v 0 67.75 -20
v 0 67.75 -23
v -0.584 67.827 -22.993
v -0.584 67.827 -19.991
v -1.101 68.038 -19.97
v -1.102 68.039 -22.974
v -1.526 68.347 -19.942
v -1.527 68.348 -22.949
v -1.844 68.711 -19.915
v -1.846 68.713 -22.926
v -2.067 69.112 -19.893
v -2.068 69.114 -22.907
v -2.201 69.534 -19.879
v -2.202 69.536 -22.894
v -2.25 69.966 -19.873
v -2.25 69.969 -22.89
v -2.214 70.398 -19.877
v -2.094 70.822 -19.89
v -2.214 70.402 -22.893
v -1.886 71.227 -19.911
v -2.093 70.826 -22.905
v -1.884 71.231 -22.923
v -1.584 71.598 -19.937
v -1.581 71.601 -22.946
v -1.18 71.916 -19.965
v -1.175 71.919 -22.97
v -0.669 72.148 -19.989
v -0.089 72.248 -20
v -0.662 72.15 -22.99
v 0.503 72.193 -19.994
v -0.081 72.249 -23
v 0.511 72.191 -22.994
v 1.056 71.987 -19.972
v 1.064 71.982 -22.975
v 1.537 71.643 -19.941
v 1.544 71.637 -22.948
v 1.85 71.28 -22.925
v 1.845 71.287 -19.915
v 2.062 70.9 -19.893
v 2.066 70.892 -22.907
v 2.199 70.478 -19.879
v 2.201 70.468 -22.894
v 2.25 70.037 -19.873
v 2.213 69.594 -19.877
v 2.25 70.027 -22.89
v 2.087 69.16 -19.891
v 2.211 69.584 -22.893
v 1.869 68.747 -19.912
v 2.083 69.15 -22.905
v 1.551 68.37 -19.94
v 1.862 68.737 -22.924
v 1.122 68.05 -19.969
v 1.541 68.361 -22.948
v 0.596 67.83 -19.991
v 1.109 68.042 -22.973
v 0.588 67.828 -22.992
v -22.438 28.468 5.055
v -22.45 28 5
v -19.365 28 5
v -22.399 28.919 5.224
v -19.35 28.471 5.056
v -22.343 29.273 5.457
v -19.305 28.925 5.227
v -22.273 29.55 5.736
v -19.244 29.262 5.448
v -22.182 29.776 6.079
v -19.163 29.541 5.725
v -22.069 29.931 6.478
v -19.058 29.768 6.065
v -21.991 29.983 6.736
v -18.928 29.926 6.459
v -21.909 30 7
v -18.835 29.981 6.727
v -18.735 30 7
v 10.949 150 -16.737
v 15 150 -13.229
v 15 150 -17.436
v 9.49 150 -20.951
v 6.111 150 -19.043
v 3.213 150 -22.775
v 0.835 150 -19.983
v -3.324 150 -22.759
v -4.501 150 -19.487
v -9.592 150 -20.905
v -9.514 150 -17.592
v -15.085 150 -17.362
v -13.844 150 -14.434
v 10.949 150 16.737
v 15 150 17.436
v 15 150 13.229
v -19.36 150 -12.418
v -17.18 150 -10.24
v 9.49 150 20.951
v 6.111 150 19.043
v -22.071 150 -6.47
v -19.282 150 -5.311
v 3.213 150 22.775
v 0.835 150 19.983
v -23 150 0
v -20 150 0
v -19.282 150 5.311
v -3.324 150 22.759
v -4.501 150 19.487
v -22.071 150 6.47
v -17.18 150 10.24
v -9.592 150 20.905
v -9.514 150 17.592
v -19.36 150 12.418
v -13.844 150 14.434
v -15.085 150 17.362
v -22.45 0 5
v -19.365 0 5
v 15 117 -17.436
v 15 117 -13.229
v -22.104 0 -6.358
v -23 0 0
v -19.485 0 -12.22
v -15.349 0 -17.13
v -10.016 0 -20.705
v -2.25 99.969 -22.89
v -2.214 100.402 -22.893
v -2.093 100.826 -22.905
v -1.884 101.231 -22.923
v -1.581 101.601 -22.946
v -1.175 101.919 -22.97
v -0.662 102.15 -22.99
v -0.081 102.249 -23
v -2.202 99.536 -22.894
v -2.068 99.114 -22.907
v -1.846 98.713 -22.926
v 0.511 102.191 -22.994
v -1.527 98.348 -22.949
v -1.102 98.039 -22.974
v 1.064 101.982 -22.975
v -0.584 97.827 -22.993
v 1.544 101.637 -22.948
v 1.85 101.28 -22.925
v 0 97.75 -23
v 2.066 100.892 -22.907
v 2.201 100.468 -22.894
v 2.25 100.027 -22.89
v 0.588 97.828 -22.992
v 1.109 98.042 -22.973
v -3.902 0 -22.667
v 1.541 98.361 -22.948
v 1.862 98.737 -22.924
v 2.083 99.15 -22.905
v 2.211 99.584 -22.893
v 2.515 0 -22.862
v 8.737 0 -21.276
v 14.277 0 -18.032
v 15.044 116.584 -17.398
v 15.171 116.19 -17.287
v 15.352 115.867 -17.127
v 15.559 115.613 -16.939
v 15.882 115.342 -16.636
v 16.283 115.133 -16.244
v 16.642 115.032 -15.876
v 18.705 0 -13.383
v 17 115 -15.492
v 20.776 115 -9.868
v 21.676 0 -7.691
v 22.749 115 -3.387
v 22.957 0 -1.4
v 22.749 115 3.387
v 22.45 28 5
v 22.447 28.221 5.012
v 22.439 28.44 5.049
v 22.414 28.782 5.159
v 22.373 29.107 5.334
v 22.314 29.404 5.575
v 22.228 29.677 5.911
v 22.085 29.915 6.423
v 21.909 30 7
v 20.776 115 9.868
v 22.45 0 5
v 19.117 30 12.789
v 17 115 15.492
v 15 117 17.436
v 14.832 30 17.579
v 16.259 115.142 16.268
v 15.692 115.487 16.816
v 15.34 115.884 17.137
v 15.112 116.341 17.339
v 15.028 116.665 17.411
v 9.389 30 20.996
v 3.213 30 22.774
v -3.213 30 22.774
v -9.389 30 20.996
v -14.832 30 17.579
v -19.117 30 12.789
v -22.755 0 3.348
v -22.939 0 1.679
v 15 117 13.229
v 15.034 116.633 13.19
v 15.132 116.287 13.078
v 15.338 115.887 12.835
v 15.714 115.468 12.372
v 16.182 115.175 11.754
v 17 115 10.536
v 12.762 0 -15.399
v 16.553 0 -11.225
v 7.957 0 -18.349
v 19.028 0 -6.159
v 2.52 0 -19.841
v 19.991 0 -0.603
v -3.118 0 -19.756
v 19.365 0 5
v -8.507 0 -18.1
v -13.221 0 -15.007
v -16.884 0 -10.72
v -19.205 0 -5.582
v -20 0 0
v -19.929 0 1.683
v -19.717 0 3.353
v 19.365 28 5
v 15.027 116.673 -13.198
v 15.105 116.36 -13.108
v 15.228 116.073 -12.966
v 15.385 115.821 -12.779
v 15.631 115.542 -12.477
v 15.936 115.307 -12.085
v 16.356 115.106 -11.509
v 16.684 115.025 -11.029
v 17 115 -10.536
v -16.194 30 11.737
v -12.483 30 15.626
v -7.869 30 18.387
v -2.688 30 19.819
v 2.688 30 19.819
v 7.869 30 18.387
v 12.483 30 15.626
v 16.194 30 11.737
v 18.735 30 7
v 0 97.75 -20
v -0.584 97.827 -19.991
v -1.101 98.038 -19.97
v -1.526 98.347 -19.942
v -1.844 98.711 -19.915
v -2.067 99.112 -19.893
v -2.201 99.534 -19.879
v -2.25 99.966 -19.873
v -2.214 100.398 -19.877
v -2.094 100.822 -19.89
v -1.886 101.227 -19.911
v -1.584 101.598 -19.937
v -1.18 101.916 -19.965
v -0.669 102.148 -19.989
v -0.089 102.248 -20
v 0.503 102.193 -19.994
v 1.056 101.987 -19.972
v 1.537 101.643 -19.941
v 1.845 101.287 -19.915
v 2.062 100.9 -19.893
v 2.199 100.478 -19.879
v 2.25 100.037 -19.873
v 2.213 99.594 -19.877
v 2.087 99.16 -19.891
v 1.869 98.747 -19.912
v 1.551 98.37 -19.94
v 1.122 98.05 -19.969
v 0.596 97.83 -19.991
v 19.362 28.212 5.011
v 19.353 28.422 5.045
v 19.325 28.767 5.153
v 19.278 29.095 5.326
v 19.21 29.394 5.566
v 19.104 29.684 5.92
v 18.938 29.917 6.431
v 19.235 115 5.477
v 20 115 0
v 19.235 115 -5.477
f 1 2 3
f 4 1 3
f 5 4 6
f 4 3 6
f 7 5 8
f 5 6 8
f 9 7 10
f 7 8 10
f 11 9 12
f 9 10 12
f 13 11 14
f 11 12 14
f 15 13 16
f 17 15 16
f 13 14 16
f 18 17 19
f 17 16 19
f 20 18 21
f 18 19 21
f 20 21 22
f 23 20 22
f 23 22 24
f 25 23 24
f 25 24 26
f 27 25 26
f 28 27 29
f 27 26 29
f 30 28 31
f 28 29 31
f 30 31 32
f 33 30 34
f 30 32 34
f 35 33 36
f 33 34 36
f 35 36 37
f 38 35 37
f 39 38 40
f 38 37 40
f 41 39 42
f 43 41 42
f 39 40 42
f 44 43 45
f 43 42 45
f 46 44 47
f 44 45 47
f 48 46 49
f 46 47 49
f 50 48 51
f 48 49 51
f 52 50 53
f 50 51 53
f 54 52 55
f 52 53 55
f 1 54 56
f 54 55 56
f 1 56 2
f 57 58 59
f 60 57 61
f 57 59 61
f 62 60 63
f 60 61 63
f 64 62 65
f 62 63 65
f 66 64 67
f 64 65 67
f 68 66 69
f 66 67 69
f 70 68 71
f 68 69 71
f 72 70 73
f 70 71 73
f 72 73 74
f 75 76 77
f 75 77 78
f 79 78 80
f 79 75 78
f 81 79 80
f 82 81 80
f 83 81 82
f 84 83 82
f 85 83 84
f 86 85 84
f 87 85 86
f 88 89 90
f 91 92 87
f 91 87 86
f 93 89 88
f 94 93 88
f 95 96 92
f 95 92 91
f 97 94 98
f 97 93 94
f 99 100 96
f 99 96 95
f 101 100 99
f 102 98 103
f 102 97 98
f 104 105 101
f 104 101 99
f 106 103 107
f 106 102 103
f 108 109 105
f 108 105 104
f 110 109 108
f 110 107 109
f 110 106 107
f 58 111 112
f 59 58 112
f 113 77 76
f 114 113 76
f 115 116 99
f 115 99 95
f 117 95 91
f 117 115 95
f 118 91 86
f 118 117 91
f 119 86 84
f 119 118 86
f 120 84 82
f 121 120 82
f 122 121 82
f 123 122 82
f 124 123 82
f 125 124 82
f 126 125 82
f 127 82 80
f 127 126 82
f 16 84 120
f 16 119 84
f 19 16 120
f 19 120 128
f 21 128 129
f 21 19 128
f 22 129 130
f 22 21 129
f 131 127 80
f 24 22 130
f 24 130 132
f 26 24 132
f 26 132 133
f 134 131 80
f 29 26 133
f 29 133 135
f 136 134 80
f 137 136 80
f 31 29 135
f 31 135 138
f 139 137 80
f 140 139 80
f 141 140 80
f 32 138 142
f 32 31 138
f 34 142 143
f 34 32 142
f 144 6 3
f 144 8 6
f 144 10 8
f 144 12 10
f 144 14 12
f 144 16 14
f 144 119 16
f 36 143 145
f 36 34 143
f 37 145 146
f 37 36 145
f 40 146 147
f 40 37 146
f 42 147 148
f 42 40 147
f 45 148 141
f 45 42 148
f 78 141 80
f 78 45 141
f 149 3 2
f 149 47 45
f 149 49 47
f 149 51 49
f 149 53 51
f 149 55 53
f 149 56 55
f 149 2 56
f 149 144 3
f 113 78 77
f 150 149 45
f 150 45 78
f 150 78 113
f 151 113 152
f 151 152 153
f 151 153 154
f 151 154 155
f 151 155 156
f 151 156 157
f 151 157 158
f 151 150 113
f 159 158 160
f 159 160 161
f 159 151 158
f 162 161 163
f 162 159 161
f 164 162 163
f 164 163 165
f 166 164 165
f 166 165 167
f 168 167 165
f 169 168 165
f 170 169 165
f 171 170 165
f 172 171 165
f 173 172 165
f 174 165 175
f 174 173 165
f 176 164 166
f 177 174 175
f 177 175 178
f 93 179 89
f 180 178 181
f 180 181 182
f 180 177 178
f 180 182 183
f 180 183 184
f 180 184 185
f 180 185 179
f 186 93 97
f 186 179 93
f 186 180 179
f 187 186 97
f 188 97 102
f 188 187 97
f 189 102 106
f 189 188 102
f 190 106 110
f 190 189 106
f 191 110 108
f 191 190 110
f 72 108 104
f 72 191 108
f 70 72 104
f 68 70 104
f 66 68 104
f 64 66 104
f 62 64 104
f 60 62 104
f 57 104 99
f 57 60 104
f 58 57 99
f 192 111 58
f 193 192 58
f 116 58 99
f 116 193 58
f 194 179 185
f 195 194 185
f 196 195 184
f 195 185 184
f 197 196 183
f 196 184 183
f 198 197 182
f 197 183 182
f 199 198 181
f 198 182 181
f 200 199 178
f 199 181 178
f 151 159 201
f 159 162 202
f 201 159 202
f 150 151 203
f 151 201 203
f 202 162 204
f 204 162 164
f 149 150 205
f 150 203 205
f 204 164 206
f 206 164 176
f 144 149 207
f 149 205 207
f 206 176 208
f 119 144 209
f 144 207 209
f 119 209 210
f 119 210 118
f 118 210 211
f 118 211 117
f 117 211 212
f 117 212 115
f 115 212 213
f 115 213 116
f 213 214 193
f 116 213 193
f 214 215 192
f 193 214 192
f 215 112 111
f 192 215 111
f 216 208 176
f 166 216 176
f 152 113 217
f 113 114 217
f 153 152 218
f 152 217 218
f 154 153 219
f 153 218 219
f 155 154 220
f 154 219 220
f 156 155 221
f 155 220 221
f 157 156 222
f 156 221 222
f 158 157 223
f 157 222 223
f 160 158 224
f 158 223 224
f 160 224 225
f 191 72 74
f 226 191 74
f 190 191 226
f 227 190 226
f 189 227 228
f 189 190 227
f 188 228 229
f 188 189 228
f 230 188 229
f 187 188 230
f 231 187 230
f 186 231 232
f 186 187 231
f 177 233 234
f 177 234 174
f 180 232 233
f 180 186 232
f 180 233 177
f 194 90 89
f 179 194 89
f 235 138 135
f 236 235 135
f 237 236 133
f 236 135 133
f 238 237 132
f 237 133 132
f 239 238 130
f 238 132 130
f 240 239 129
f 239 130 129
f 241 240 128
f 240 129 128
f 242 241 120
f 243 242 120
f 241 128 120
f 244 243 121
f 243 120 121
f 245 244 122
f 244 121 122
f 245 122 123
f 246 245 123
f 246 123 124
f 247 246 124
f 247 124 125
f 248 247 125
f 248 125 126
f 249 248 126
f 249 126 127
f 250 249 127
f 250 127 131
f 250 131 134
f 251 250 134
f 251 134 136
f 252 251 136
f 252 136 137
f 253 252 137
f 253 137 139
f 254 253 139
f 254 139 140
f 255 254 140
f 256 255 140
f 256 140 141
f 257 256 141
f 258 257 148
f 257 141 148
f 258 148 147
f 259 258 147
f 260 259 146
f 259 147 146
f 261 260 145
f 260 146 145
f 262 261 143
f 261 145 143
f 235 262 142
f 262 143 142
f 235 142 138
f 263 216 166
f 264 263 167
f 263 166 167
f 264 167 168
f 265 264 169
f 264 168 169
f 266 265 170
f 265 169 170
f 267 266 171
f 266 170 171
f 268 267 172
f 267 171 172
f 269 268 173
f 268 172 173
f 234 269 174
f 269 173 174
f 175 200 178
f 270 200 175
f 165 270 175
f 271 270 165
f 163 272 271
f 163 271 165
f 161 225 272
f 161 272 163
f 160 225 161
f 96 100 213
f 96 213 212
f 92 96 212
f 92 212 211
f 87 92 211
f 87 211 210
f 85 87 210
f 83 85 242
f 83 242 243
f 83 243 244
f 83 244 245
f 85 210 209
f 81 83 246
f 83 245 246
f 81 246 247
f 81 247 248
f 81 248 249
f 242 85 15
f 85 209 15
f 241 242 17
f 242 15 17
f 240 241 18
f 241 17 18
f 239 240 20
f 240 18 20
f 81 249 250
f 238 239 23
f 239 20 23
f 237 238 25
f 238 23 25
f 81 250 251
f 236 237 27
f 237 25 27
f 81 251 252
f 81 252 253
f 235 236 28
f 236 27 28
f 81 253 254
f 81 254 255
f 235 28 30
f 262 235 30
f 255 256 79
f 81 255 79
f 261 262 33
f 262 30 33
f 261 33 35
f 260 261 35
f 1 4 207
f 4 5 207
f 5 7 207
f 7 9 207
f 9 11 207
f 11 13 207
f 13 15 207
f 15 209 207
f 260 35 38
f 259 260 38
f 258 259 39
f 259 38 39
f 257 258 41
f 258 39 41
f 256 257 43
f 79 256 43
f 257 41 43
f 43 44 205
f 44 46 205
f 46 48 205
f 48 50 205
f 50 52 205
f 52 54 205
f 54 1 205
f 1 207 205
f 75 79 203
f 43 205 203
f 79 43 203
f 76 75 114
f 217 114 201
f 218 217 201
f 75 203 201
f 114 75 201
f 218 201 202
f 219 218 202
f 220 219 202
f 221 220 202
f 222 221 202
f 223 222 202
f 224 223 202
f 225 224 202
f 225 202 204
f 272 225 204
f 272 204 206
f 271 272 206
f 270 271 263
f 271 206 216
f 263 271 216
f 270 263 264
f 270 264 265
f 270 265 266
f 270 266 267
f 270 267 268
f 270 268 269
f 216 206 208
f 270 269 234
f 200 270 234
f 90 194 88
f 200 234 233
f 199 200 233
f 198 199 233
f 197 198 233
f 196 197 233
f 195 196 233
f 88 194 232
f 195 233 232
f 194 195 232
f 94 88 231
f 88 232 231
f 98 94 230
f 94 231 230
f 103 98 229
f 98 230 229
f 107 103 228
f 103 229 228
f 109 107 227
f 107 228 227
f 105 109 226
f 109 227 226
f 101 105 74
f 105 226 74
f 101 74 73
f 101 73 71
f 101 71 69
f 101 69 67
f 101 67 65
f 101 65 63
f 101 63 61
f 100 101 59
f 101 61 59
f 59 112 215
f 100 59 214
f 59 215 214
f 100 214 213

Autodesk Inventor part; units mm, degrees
ref_plane "YZ Plane" through (0, 0, 0) normal (1, 0, 0) x (0, 1, 0)
ref_plane "XZ Plane" through (0, 0, 0) normal (0, 1, 0) x (-1, 0, 0)
sketch "Sketch1" plane through (0, 0, 0) normal (0, 1, 0) x (-1, 0, 0)
  circle A0 centre (0, 0) radius 20
  circle A1 centre (0, 0) radius 23
  dimension "d0" = 40
  dimension "d1" = 3
extrude "Extrusion1" add sketch "Sketch1" along normal blind 150
ref_plane "Work Plane1" through (0, 0, 23) normal (0, 0, 1) x (1, 0, 0)
sketch "Sketch2" plane through (0, 0, 23) normal (0, 0, 1) x (1, 0, 0)
  line L0 (-17.5, 140) -> (17.5, 140)
  line L1 (17.5, 140) -> (17.5, 105)
  line L2 (17.5, 105) -> (-17.5, 105)
  line L3 (-17.5, 105) -> (-17.5, 140)
  line L4 (-17.5, 90) -> (17.5, 90)
  line L5 (17.5, 90) -> (17.5, 55)
  line L6 (17.5, 55) -> (-17.5, 55)
  line L7 (-17.5, 55) -> (-17.5, 90)
  line L8 (23, 150) -> (-23, 150) projected
  line L9 (0, 156) -> (0, -26) projected
  line L10 (-23, 0) -> (23, 0) projected
  point P0 (0, 0)
  dimension "d5" = 10
  dimension "d6" = 35
  dimension "d7" = 17.5
  dimension "d8" = 35
  dimension "d9" = 35
  dimension "d23" = 15
  dimension "d24" = 55
extrude "Extrusion2" [suppressed]
fillet "Fillet1" [suppressed]
sketch "Sketch3" plane through (0, 0, 0) normal (0, 0, 1) x (1, 0, 0)
  line L0 (23, 150) -> (-23, 150) projected
  point P0 (0, 0)
  point P1 (0, 100)
  point P2 (0, 70)
  dimension "d14" = 30
  dimension "d15" = 50
hole "Hole1" at (0, 100, 0) at (0, 70, 0) direction (0, 0, -1) diameter 4.5 end through all clearance for "Socket Head Cap Screw" size "M4" standard "Ansi Metric M Profile"
sketch "Sketch4" plane through (0, 150, 0) normal (0, 1, 0) x (1, 0, 0)
  circle A0 centre (0, 0) radius 20 projected
  circle A1 centre (0, 0) radius 23 projected
  line L0 (15, 17.4356) -> (15, -17.4356)
  circle A2 centre (0, 0) radius 23 projected
  dimension "d25" = 15
extrude "Extrusion3" cut sketch "Sketch4" against normal blind 35 contours A0 L0 | A0 L0 A1 picked at (16.6667, 0) picked at (17.0329, 12.1097)
fillet "Fillet2" radius 2 2 edges at (15, 115, -15.3322) (15, 115, 15.3322)
sketch "Sketch5" plane through (0, 0, 0) normal (0, -1, 0) x (1, 0, 0)
  circle A0 centre (0, 0) radius 20 projected
  circle A1 centre (0, 0) radius 23 projected
  line L0 (-22.4499, 5) -> (22.4499, 5)
  circle A2 centre (0, 0) radius 23 projected
  dimension "d29" = 5
extrude "Extrusion4" cut sketch "Sketch5" against normal blind 30 contours L0 A0 | A0 L0 A1 picked at (5.8749, 6.4846) picked at (-0.7969, 21.8366)
fillet "Fillet3" radius 2 2 edges at (-20.9074, 30, 5) (20.9074, 30, 5)
equation "\"d7\" = 0.5 * d6"
equation "\"d8\" = d6"
equation "\"d9\" = d8"
properties part number "Pancake_Drop Pipe" material "PVC-Piping"
